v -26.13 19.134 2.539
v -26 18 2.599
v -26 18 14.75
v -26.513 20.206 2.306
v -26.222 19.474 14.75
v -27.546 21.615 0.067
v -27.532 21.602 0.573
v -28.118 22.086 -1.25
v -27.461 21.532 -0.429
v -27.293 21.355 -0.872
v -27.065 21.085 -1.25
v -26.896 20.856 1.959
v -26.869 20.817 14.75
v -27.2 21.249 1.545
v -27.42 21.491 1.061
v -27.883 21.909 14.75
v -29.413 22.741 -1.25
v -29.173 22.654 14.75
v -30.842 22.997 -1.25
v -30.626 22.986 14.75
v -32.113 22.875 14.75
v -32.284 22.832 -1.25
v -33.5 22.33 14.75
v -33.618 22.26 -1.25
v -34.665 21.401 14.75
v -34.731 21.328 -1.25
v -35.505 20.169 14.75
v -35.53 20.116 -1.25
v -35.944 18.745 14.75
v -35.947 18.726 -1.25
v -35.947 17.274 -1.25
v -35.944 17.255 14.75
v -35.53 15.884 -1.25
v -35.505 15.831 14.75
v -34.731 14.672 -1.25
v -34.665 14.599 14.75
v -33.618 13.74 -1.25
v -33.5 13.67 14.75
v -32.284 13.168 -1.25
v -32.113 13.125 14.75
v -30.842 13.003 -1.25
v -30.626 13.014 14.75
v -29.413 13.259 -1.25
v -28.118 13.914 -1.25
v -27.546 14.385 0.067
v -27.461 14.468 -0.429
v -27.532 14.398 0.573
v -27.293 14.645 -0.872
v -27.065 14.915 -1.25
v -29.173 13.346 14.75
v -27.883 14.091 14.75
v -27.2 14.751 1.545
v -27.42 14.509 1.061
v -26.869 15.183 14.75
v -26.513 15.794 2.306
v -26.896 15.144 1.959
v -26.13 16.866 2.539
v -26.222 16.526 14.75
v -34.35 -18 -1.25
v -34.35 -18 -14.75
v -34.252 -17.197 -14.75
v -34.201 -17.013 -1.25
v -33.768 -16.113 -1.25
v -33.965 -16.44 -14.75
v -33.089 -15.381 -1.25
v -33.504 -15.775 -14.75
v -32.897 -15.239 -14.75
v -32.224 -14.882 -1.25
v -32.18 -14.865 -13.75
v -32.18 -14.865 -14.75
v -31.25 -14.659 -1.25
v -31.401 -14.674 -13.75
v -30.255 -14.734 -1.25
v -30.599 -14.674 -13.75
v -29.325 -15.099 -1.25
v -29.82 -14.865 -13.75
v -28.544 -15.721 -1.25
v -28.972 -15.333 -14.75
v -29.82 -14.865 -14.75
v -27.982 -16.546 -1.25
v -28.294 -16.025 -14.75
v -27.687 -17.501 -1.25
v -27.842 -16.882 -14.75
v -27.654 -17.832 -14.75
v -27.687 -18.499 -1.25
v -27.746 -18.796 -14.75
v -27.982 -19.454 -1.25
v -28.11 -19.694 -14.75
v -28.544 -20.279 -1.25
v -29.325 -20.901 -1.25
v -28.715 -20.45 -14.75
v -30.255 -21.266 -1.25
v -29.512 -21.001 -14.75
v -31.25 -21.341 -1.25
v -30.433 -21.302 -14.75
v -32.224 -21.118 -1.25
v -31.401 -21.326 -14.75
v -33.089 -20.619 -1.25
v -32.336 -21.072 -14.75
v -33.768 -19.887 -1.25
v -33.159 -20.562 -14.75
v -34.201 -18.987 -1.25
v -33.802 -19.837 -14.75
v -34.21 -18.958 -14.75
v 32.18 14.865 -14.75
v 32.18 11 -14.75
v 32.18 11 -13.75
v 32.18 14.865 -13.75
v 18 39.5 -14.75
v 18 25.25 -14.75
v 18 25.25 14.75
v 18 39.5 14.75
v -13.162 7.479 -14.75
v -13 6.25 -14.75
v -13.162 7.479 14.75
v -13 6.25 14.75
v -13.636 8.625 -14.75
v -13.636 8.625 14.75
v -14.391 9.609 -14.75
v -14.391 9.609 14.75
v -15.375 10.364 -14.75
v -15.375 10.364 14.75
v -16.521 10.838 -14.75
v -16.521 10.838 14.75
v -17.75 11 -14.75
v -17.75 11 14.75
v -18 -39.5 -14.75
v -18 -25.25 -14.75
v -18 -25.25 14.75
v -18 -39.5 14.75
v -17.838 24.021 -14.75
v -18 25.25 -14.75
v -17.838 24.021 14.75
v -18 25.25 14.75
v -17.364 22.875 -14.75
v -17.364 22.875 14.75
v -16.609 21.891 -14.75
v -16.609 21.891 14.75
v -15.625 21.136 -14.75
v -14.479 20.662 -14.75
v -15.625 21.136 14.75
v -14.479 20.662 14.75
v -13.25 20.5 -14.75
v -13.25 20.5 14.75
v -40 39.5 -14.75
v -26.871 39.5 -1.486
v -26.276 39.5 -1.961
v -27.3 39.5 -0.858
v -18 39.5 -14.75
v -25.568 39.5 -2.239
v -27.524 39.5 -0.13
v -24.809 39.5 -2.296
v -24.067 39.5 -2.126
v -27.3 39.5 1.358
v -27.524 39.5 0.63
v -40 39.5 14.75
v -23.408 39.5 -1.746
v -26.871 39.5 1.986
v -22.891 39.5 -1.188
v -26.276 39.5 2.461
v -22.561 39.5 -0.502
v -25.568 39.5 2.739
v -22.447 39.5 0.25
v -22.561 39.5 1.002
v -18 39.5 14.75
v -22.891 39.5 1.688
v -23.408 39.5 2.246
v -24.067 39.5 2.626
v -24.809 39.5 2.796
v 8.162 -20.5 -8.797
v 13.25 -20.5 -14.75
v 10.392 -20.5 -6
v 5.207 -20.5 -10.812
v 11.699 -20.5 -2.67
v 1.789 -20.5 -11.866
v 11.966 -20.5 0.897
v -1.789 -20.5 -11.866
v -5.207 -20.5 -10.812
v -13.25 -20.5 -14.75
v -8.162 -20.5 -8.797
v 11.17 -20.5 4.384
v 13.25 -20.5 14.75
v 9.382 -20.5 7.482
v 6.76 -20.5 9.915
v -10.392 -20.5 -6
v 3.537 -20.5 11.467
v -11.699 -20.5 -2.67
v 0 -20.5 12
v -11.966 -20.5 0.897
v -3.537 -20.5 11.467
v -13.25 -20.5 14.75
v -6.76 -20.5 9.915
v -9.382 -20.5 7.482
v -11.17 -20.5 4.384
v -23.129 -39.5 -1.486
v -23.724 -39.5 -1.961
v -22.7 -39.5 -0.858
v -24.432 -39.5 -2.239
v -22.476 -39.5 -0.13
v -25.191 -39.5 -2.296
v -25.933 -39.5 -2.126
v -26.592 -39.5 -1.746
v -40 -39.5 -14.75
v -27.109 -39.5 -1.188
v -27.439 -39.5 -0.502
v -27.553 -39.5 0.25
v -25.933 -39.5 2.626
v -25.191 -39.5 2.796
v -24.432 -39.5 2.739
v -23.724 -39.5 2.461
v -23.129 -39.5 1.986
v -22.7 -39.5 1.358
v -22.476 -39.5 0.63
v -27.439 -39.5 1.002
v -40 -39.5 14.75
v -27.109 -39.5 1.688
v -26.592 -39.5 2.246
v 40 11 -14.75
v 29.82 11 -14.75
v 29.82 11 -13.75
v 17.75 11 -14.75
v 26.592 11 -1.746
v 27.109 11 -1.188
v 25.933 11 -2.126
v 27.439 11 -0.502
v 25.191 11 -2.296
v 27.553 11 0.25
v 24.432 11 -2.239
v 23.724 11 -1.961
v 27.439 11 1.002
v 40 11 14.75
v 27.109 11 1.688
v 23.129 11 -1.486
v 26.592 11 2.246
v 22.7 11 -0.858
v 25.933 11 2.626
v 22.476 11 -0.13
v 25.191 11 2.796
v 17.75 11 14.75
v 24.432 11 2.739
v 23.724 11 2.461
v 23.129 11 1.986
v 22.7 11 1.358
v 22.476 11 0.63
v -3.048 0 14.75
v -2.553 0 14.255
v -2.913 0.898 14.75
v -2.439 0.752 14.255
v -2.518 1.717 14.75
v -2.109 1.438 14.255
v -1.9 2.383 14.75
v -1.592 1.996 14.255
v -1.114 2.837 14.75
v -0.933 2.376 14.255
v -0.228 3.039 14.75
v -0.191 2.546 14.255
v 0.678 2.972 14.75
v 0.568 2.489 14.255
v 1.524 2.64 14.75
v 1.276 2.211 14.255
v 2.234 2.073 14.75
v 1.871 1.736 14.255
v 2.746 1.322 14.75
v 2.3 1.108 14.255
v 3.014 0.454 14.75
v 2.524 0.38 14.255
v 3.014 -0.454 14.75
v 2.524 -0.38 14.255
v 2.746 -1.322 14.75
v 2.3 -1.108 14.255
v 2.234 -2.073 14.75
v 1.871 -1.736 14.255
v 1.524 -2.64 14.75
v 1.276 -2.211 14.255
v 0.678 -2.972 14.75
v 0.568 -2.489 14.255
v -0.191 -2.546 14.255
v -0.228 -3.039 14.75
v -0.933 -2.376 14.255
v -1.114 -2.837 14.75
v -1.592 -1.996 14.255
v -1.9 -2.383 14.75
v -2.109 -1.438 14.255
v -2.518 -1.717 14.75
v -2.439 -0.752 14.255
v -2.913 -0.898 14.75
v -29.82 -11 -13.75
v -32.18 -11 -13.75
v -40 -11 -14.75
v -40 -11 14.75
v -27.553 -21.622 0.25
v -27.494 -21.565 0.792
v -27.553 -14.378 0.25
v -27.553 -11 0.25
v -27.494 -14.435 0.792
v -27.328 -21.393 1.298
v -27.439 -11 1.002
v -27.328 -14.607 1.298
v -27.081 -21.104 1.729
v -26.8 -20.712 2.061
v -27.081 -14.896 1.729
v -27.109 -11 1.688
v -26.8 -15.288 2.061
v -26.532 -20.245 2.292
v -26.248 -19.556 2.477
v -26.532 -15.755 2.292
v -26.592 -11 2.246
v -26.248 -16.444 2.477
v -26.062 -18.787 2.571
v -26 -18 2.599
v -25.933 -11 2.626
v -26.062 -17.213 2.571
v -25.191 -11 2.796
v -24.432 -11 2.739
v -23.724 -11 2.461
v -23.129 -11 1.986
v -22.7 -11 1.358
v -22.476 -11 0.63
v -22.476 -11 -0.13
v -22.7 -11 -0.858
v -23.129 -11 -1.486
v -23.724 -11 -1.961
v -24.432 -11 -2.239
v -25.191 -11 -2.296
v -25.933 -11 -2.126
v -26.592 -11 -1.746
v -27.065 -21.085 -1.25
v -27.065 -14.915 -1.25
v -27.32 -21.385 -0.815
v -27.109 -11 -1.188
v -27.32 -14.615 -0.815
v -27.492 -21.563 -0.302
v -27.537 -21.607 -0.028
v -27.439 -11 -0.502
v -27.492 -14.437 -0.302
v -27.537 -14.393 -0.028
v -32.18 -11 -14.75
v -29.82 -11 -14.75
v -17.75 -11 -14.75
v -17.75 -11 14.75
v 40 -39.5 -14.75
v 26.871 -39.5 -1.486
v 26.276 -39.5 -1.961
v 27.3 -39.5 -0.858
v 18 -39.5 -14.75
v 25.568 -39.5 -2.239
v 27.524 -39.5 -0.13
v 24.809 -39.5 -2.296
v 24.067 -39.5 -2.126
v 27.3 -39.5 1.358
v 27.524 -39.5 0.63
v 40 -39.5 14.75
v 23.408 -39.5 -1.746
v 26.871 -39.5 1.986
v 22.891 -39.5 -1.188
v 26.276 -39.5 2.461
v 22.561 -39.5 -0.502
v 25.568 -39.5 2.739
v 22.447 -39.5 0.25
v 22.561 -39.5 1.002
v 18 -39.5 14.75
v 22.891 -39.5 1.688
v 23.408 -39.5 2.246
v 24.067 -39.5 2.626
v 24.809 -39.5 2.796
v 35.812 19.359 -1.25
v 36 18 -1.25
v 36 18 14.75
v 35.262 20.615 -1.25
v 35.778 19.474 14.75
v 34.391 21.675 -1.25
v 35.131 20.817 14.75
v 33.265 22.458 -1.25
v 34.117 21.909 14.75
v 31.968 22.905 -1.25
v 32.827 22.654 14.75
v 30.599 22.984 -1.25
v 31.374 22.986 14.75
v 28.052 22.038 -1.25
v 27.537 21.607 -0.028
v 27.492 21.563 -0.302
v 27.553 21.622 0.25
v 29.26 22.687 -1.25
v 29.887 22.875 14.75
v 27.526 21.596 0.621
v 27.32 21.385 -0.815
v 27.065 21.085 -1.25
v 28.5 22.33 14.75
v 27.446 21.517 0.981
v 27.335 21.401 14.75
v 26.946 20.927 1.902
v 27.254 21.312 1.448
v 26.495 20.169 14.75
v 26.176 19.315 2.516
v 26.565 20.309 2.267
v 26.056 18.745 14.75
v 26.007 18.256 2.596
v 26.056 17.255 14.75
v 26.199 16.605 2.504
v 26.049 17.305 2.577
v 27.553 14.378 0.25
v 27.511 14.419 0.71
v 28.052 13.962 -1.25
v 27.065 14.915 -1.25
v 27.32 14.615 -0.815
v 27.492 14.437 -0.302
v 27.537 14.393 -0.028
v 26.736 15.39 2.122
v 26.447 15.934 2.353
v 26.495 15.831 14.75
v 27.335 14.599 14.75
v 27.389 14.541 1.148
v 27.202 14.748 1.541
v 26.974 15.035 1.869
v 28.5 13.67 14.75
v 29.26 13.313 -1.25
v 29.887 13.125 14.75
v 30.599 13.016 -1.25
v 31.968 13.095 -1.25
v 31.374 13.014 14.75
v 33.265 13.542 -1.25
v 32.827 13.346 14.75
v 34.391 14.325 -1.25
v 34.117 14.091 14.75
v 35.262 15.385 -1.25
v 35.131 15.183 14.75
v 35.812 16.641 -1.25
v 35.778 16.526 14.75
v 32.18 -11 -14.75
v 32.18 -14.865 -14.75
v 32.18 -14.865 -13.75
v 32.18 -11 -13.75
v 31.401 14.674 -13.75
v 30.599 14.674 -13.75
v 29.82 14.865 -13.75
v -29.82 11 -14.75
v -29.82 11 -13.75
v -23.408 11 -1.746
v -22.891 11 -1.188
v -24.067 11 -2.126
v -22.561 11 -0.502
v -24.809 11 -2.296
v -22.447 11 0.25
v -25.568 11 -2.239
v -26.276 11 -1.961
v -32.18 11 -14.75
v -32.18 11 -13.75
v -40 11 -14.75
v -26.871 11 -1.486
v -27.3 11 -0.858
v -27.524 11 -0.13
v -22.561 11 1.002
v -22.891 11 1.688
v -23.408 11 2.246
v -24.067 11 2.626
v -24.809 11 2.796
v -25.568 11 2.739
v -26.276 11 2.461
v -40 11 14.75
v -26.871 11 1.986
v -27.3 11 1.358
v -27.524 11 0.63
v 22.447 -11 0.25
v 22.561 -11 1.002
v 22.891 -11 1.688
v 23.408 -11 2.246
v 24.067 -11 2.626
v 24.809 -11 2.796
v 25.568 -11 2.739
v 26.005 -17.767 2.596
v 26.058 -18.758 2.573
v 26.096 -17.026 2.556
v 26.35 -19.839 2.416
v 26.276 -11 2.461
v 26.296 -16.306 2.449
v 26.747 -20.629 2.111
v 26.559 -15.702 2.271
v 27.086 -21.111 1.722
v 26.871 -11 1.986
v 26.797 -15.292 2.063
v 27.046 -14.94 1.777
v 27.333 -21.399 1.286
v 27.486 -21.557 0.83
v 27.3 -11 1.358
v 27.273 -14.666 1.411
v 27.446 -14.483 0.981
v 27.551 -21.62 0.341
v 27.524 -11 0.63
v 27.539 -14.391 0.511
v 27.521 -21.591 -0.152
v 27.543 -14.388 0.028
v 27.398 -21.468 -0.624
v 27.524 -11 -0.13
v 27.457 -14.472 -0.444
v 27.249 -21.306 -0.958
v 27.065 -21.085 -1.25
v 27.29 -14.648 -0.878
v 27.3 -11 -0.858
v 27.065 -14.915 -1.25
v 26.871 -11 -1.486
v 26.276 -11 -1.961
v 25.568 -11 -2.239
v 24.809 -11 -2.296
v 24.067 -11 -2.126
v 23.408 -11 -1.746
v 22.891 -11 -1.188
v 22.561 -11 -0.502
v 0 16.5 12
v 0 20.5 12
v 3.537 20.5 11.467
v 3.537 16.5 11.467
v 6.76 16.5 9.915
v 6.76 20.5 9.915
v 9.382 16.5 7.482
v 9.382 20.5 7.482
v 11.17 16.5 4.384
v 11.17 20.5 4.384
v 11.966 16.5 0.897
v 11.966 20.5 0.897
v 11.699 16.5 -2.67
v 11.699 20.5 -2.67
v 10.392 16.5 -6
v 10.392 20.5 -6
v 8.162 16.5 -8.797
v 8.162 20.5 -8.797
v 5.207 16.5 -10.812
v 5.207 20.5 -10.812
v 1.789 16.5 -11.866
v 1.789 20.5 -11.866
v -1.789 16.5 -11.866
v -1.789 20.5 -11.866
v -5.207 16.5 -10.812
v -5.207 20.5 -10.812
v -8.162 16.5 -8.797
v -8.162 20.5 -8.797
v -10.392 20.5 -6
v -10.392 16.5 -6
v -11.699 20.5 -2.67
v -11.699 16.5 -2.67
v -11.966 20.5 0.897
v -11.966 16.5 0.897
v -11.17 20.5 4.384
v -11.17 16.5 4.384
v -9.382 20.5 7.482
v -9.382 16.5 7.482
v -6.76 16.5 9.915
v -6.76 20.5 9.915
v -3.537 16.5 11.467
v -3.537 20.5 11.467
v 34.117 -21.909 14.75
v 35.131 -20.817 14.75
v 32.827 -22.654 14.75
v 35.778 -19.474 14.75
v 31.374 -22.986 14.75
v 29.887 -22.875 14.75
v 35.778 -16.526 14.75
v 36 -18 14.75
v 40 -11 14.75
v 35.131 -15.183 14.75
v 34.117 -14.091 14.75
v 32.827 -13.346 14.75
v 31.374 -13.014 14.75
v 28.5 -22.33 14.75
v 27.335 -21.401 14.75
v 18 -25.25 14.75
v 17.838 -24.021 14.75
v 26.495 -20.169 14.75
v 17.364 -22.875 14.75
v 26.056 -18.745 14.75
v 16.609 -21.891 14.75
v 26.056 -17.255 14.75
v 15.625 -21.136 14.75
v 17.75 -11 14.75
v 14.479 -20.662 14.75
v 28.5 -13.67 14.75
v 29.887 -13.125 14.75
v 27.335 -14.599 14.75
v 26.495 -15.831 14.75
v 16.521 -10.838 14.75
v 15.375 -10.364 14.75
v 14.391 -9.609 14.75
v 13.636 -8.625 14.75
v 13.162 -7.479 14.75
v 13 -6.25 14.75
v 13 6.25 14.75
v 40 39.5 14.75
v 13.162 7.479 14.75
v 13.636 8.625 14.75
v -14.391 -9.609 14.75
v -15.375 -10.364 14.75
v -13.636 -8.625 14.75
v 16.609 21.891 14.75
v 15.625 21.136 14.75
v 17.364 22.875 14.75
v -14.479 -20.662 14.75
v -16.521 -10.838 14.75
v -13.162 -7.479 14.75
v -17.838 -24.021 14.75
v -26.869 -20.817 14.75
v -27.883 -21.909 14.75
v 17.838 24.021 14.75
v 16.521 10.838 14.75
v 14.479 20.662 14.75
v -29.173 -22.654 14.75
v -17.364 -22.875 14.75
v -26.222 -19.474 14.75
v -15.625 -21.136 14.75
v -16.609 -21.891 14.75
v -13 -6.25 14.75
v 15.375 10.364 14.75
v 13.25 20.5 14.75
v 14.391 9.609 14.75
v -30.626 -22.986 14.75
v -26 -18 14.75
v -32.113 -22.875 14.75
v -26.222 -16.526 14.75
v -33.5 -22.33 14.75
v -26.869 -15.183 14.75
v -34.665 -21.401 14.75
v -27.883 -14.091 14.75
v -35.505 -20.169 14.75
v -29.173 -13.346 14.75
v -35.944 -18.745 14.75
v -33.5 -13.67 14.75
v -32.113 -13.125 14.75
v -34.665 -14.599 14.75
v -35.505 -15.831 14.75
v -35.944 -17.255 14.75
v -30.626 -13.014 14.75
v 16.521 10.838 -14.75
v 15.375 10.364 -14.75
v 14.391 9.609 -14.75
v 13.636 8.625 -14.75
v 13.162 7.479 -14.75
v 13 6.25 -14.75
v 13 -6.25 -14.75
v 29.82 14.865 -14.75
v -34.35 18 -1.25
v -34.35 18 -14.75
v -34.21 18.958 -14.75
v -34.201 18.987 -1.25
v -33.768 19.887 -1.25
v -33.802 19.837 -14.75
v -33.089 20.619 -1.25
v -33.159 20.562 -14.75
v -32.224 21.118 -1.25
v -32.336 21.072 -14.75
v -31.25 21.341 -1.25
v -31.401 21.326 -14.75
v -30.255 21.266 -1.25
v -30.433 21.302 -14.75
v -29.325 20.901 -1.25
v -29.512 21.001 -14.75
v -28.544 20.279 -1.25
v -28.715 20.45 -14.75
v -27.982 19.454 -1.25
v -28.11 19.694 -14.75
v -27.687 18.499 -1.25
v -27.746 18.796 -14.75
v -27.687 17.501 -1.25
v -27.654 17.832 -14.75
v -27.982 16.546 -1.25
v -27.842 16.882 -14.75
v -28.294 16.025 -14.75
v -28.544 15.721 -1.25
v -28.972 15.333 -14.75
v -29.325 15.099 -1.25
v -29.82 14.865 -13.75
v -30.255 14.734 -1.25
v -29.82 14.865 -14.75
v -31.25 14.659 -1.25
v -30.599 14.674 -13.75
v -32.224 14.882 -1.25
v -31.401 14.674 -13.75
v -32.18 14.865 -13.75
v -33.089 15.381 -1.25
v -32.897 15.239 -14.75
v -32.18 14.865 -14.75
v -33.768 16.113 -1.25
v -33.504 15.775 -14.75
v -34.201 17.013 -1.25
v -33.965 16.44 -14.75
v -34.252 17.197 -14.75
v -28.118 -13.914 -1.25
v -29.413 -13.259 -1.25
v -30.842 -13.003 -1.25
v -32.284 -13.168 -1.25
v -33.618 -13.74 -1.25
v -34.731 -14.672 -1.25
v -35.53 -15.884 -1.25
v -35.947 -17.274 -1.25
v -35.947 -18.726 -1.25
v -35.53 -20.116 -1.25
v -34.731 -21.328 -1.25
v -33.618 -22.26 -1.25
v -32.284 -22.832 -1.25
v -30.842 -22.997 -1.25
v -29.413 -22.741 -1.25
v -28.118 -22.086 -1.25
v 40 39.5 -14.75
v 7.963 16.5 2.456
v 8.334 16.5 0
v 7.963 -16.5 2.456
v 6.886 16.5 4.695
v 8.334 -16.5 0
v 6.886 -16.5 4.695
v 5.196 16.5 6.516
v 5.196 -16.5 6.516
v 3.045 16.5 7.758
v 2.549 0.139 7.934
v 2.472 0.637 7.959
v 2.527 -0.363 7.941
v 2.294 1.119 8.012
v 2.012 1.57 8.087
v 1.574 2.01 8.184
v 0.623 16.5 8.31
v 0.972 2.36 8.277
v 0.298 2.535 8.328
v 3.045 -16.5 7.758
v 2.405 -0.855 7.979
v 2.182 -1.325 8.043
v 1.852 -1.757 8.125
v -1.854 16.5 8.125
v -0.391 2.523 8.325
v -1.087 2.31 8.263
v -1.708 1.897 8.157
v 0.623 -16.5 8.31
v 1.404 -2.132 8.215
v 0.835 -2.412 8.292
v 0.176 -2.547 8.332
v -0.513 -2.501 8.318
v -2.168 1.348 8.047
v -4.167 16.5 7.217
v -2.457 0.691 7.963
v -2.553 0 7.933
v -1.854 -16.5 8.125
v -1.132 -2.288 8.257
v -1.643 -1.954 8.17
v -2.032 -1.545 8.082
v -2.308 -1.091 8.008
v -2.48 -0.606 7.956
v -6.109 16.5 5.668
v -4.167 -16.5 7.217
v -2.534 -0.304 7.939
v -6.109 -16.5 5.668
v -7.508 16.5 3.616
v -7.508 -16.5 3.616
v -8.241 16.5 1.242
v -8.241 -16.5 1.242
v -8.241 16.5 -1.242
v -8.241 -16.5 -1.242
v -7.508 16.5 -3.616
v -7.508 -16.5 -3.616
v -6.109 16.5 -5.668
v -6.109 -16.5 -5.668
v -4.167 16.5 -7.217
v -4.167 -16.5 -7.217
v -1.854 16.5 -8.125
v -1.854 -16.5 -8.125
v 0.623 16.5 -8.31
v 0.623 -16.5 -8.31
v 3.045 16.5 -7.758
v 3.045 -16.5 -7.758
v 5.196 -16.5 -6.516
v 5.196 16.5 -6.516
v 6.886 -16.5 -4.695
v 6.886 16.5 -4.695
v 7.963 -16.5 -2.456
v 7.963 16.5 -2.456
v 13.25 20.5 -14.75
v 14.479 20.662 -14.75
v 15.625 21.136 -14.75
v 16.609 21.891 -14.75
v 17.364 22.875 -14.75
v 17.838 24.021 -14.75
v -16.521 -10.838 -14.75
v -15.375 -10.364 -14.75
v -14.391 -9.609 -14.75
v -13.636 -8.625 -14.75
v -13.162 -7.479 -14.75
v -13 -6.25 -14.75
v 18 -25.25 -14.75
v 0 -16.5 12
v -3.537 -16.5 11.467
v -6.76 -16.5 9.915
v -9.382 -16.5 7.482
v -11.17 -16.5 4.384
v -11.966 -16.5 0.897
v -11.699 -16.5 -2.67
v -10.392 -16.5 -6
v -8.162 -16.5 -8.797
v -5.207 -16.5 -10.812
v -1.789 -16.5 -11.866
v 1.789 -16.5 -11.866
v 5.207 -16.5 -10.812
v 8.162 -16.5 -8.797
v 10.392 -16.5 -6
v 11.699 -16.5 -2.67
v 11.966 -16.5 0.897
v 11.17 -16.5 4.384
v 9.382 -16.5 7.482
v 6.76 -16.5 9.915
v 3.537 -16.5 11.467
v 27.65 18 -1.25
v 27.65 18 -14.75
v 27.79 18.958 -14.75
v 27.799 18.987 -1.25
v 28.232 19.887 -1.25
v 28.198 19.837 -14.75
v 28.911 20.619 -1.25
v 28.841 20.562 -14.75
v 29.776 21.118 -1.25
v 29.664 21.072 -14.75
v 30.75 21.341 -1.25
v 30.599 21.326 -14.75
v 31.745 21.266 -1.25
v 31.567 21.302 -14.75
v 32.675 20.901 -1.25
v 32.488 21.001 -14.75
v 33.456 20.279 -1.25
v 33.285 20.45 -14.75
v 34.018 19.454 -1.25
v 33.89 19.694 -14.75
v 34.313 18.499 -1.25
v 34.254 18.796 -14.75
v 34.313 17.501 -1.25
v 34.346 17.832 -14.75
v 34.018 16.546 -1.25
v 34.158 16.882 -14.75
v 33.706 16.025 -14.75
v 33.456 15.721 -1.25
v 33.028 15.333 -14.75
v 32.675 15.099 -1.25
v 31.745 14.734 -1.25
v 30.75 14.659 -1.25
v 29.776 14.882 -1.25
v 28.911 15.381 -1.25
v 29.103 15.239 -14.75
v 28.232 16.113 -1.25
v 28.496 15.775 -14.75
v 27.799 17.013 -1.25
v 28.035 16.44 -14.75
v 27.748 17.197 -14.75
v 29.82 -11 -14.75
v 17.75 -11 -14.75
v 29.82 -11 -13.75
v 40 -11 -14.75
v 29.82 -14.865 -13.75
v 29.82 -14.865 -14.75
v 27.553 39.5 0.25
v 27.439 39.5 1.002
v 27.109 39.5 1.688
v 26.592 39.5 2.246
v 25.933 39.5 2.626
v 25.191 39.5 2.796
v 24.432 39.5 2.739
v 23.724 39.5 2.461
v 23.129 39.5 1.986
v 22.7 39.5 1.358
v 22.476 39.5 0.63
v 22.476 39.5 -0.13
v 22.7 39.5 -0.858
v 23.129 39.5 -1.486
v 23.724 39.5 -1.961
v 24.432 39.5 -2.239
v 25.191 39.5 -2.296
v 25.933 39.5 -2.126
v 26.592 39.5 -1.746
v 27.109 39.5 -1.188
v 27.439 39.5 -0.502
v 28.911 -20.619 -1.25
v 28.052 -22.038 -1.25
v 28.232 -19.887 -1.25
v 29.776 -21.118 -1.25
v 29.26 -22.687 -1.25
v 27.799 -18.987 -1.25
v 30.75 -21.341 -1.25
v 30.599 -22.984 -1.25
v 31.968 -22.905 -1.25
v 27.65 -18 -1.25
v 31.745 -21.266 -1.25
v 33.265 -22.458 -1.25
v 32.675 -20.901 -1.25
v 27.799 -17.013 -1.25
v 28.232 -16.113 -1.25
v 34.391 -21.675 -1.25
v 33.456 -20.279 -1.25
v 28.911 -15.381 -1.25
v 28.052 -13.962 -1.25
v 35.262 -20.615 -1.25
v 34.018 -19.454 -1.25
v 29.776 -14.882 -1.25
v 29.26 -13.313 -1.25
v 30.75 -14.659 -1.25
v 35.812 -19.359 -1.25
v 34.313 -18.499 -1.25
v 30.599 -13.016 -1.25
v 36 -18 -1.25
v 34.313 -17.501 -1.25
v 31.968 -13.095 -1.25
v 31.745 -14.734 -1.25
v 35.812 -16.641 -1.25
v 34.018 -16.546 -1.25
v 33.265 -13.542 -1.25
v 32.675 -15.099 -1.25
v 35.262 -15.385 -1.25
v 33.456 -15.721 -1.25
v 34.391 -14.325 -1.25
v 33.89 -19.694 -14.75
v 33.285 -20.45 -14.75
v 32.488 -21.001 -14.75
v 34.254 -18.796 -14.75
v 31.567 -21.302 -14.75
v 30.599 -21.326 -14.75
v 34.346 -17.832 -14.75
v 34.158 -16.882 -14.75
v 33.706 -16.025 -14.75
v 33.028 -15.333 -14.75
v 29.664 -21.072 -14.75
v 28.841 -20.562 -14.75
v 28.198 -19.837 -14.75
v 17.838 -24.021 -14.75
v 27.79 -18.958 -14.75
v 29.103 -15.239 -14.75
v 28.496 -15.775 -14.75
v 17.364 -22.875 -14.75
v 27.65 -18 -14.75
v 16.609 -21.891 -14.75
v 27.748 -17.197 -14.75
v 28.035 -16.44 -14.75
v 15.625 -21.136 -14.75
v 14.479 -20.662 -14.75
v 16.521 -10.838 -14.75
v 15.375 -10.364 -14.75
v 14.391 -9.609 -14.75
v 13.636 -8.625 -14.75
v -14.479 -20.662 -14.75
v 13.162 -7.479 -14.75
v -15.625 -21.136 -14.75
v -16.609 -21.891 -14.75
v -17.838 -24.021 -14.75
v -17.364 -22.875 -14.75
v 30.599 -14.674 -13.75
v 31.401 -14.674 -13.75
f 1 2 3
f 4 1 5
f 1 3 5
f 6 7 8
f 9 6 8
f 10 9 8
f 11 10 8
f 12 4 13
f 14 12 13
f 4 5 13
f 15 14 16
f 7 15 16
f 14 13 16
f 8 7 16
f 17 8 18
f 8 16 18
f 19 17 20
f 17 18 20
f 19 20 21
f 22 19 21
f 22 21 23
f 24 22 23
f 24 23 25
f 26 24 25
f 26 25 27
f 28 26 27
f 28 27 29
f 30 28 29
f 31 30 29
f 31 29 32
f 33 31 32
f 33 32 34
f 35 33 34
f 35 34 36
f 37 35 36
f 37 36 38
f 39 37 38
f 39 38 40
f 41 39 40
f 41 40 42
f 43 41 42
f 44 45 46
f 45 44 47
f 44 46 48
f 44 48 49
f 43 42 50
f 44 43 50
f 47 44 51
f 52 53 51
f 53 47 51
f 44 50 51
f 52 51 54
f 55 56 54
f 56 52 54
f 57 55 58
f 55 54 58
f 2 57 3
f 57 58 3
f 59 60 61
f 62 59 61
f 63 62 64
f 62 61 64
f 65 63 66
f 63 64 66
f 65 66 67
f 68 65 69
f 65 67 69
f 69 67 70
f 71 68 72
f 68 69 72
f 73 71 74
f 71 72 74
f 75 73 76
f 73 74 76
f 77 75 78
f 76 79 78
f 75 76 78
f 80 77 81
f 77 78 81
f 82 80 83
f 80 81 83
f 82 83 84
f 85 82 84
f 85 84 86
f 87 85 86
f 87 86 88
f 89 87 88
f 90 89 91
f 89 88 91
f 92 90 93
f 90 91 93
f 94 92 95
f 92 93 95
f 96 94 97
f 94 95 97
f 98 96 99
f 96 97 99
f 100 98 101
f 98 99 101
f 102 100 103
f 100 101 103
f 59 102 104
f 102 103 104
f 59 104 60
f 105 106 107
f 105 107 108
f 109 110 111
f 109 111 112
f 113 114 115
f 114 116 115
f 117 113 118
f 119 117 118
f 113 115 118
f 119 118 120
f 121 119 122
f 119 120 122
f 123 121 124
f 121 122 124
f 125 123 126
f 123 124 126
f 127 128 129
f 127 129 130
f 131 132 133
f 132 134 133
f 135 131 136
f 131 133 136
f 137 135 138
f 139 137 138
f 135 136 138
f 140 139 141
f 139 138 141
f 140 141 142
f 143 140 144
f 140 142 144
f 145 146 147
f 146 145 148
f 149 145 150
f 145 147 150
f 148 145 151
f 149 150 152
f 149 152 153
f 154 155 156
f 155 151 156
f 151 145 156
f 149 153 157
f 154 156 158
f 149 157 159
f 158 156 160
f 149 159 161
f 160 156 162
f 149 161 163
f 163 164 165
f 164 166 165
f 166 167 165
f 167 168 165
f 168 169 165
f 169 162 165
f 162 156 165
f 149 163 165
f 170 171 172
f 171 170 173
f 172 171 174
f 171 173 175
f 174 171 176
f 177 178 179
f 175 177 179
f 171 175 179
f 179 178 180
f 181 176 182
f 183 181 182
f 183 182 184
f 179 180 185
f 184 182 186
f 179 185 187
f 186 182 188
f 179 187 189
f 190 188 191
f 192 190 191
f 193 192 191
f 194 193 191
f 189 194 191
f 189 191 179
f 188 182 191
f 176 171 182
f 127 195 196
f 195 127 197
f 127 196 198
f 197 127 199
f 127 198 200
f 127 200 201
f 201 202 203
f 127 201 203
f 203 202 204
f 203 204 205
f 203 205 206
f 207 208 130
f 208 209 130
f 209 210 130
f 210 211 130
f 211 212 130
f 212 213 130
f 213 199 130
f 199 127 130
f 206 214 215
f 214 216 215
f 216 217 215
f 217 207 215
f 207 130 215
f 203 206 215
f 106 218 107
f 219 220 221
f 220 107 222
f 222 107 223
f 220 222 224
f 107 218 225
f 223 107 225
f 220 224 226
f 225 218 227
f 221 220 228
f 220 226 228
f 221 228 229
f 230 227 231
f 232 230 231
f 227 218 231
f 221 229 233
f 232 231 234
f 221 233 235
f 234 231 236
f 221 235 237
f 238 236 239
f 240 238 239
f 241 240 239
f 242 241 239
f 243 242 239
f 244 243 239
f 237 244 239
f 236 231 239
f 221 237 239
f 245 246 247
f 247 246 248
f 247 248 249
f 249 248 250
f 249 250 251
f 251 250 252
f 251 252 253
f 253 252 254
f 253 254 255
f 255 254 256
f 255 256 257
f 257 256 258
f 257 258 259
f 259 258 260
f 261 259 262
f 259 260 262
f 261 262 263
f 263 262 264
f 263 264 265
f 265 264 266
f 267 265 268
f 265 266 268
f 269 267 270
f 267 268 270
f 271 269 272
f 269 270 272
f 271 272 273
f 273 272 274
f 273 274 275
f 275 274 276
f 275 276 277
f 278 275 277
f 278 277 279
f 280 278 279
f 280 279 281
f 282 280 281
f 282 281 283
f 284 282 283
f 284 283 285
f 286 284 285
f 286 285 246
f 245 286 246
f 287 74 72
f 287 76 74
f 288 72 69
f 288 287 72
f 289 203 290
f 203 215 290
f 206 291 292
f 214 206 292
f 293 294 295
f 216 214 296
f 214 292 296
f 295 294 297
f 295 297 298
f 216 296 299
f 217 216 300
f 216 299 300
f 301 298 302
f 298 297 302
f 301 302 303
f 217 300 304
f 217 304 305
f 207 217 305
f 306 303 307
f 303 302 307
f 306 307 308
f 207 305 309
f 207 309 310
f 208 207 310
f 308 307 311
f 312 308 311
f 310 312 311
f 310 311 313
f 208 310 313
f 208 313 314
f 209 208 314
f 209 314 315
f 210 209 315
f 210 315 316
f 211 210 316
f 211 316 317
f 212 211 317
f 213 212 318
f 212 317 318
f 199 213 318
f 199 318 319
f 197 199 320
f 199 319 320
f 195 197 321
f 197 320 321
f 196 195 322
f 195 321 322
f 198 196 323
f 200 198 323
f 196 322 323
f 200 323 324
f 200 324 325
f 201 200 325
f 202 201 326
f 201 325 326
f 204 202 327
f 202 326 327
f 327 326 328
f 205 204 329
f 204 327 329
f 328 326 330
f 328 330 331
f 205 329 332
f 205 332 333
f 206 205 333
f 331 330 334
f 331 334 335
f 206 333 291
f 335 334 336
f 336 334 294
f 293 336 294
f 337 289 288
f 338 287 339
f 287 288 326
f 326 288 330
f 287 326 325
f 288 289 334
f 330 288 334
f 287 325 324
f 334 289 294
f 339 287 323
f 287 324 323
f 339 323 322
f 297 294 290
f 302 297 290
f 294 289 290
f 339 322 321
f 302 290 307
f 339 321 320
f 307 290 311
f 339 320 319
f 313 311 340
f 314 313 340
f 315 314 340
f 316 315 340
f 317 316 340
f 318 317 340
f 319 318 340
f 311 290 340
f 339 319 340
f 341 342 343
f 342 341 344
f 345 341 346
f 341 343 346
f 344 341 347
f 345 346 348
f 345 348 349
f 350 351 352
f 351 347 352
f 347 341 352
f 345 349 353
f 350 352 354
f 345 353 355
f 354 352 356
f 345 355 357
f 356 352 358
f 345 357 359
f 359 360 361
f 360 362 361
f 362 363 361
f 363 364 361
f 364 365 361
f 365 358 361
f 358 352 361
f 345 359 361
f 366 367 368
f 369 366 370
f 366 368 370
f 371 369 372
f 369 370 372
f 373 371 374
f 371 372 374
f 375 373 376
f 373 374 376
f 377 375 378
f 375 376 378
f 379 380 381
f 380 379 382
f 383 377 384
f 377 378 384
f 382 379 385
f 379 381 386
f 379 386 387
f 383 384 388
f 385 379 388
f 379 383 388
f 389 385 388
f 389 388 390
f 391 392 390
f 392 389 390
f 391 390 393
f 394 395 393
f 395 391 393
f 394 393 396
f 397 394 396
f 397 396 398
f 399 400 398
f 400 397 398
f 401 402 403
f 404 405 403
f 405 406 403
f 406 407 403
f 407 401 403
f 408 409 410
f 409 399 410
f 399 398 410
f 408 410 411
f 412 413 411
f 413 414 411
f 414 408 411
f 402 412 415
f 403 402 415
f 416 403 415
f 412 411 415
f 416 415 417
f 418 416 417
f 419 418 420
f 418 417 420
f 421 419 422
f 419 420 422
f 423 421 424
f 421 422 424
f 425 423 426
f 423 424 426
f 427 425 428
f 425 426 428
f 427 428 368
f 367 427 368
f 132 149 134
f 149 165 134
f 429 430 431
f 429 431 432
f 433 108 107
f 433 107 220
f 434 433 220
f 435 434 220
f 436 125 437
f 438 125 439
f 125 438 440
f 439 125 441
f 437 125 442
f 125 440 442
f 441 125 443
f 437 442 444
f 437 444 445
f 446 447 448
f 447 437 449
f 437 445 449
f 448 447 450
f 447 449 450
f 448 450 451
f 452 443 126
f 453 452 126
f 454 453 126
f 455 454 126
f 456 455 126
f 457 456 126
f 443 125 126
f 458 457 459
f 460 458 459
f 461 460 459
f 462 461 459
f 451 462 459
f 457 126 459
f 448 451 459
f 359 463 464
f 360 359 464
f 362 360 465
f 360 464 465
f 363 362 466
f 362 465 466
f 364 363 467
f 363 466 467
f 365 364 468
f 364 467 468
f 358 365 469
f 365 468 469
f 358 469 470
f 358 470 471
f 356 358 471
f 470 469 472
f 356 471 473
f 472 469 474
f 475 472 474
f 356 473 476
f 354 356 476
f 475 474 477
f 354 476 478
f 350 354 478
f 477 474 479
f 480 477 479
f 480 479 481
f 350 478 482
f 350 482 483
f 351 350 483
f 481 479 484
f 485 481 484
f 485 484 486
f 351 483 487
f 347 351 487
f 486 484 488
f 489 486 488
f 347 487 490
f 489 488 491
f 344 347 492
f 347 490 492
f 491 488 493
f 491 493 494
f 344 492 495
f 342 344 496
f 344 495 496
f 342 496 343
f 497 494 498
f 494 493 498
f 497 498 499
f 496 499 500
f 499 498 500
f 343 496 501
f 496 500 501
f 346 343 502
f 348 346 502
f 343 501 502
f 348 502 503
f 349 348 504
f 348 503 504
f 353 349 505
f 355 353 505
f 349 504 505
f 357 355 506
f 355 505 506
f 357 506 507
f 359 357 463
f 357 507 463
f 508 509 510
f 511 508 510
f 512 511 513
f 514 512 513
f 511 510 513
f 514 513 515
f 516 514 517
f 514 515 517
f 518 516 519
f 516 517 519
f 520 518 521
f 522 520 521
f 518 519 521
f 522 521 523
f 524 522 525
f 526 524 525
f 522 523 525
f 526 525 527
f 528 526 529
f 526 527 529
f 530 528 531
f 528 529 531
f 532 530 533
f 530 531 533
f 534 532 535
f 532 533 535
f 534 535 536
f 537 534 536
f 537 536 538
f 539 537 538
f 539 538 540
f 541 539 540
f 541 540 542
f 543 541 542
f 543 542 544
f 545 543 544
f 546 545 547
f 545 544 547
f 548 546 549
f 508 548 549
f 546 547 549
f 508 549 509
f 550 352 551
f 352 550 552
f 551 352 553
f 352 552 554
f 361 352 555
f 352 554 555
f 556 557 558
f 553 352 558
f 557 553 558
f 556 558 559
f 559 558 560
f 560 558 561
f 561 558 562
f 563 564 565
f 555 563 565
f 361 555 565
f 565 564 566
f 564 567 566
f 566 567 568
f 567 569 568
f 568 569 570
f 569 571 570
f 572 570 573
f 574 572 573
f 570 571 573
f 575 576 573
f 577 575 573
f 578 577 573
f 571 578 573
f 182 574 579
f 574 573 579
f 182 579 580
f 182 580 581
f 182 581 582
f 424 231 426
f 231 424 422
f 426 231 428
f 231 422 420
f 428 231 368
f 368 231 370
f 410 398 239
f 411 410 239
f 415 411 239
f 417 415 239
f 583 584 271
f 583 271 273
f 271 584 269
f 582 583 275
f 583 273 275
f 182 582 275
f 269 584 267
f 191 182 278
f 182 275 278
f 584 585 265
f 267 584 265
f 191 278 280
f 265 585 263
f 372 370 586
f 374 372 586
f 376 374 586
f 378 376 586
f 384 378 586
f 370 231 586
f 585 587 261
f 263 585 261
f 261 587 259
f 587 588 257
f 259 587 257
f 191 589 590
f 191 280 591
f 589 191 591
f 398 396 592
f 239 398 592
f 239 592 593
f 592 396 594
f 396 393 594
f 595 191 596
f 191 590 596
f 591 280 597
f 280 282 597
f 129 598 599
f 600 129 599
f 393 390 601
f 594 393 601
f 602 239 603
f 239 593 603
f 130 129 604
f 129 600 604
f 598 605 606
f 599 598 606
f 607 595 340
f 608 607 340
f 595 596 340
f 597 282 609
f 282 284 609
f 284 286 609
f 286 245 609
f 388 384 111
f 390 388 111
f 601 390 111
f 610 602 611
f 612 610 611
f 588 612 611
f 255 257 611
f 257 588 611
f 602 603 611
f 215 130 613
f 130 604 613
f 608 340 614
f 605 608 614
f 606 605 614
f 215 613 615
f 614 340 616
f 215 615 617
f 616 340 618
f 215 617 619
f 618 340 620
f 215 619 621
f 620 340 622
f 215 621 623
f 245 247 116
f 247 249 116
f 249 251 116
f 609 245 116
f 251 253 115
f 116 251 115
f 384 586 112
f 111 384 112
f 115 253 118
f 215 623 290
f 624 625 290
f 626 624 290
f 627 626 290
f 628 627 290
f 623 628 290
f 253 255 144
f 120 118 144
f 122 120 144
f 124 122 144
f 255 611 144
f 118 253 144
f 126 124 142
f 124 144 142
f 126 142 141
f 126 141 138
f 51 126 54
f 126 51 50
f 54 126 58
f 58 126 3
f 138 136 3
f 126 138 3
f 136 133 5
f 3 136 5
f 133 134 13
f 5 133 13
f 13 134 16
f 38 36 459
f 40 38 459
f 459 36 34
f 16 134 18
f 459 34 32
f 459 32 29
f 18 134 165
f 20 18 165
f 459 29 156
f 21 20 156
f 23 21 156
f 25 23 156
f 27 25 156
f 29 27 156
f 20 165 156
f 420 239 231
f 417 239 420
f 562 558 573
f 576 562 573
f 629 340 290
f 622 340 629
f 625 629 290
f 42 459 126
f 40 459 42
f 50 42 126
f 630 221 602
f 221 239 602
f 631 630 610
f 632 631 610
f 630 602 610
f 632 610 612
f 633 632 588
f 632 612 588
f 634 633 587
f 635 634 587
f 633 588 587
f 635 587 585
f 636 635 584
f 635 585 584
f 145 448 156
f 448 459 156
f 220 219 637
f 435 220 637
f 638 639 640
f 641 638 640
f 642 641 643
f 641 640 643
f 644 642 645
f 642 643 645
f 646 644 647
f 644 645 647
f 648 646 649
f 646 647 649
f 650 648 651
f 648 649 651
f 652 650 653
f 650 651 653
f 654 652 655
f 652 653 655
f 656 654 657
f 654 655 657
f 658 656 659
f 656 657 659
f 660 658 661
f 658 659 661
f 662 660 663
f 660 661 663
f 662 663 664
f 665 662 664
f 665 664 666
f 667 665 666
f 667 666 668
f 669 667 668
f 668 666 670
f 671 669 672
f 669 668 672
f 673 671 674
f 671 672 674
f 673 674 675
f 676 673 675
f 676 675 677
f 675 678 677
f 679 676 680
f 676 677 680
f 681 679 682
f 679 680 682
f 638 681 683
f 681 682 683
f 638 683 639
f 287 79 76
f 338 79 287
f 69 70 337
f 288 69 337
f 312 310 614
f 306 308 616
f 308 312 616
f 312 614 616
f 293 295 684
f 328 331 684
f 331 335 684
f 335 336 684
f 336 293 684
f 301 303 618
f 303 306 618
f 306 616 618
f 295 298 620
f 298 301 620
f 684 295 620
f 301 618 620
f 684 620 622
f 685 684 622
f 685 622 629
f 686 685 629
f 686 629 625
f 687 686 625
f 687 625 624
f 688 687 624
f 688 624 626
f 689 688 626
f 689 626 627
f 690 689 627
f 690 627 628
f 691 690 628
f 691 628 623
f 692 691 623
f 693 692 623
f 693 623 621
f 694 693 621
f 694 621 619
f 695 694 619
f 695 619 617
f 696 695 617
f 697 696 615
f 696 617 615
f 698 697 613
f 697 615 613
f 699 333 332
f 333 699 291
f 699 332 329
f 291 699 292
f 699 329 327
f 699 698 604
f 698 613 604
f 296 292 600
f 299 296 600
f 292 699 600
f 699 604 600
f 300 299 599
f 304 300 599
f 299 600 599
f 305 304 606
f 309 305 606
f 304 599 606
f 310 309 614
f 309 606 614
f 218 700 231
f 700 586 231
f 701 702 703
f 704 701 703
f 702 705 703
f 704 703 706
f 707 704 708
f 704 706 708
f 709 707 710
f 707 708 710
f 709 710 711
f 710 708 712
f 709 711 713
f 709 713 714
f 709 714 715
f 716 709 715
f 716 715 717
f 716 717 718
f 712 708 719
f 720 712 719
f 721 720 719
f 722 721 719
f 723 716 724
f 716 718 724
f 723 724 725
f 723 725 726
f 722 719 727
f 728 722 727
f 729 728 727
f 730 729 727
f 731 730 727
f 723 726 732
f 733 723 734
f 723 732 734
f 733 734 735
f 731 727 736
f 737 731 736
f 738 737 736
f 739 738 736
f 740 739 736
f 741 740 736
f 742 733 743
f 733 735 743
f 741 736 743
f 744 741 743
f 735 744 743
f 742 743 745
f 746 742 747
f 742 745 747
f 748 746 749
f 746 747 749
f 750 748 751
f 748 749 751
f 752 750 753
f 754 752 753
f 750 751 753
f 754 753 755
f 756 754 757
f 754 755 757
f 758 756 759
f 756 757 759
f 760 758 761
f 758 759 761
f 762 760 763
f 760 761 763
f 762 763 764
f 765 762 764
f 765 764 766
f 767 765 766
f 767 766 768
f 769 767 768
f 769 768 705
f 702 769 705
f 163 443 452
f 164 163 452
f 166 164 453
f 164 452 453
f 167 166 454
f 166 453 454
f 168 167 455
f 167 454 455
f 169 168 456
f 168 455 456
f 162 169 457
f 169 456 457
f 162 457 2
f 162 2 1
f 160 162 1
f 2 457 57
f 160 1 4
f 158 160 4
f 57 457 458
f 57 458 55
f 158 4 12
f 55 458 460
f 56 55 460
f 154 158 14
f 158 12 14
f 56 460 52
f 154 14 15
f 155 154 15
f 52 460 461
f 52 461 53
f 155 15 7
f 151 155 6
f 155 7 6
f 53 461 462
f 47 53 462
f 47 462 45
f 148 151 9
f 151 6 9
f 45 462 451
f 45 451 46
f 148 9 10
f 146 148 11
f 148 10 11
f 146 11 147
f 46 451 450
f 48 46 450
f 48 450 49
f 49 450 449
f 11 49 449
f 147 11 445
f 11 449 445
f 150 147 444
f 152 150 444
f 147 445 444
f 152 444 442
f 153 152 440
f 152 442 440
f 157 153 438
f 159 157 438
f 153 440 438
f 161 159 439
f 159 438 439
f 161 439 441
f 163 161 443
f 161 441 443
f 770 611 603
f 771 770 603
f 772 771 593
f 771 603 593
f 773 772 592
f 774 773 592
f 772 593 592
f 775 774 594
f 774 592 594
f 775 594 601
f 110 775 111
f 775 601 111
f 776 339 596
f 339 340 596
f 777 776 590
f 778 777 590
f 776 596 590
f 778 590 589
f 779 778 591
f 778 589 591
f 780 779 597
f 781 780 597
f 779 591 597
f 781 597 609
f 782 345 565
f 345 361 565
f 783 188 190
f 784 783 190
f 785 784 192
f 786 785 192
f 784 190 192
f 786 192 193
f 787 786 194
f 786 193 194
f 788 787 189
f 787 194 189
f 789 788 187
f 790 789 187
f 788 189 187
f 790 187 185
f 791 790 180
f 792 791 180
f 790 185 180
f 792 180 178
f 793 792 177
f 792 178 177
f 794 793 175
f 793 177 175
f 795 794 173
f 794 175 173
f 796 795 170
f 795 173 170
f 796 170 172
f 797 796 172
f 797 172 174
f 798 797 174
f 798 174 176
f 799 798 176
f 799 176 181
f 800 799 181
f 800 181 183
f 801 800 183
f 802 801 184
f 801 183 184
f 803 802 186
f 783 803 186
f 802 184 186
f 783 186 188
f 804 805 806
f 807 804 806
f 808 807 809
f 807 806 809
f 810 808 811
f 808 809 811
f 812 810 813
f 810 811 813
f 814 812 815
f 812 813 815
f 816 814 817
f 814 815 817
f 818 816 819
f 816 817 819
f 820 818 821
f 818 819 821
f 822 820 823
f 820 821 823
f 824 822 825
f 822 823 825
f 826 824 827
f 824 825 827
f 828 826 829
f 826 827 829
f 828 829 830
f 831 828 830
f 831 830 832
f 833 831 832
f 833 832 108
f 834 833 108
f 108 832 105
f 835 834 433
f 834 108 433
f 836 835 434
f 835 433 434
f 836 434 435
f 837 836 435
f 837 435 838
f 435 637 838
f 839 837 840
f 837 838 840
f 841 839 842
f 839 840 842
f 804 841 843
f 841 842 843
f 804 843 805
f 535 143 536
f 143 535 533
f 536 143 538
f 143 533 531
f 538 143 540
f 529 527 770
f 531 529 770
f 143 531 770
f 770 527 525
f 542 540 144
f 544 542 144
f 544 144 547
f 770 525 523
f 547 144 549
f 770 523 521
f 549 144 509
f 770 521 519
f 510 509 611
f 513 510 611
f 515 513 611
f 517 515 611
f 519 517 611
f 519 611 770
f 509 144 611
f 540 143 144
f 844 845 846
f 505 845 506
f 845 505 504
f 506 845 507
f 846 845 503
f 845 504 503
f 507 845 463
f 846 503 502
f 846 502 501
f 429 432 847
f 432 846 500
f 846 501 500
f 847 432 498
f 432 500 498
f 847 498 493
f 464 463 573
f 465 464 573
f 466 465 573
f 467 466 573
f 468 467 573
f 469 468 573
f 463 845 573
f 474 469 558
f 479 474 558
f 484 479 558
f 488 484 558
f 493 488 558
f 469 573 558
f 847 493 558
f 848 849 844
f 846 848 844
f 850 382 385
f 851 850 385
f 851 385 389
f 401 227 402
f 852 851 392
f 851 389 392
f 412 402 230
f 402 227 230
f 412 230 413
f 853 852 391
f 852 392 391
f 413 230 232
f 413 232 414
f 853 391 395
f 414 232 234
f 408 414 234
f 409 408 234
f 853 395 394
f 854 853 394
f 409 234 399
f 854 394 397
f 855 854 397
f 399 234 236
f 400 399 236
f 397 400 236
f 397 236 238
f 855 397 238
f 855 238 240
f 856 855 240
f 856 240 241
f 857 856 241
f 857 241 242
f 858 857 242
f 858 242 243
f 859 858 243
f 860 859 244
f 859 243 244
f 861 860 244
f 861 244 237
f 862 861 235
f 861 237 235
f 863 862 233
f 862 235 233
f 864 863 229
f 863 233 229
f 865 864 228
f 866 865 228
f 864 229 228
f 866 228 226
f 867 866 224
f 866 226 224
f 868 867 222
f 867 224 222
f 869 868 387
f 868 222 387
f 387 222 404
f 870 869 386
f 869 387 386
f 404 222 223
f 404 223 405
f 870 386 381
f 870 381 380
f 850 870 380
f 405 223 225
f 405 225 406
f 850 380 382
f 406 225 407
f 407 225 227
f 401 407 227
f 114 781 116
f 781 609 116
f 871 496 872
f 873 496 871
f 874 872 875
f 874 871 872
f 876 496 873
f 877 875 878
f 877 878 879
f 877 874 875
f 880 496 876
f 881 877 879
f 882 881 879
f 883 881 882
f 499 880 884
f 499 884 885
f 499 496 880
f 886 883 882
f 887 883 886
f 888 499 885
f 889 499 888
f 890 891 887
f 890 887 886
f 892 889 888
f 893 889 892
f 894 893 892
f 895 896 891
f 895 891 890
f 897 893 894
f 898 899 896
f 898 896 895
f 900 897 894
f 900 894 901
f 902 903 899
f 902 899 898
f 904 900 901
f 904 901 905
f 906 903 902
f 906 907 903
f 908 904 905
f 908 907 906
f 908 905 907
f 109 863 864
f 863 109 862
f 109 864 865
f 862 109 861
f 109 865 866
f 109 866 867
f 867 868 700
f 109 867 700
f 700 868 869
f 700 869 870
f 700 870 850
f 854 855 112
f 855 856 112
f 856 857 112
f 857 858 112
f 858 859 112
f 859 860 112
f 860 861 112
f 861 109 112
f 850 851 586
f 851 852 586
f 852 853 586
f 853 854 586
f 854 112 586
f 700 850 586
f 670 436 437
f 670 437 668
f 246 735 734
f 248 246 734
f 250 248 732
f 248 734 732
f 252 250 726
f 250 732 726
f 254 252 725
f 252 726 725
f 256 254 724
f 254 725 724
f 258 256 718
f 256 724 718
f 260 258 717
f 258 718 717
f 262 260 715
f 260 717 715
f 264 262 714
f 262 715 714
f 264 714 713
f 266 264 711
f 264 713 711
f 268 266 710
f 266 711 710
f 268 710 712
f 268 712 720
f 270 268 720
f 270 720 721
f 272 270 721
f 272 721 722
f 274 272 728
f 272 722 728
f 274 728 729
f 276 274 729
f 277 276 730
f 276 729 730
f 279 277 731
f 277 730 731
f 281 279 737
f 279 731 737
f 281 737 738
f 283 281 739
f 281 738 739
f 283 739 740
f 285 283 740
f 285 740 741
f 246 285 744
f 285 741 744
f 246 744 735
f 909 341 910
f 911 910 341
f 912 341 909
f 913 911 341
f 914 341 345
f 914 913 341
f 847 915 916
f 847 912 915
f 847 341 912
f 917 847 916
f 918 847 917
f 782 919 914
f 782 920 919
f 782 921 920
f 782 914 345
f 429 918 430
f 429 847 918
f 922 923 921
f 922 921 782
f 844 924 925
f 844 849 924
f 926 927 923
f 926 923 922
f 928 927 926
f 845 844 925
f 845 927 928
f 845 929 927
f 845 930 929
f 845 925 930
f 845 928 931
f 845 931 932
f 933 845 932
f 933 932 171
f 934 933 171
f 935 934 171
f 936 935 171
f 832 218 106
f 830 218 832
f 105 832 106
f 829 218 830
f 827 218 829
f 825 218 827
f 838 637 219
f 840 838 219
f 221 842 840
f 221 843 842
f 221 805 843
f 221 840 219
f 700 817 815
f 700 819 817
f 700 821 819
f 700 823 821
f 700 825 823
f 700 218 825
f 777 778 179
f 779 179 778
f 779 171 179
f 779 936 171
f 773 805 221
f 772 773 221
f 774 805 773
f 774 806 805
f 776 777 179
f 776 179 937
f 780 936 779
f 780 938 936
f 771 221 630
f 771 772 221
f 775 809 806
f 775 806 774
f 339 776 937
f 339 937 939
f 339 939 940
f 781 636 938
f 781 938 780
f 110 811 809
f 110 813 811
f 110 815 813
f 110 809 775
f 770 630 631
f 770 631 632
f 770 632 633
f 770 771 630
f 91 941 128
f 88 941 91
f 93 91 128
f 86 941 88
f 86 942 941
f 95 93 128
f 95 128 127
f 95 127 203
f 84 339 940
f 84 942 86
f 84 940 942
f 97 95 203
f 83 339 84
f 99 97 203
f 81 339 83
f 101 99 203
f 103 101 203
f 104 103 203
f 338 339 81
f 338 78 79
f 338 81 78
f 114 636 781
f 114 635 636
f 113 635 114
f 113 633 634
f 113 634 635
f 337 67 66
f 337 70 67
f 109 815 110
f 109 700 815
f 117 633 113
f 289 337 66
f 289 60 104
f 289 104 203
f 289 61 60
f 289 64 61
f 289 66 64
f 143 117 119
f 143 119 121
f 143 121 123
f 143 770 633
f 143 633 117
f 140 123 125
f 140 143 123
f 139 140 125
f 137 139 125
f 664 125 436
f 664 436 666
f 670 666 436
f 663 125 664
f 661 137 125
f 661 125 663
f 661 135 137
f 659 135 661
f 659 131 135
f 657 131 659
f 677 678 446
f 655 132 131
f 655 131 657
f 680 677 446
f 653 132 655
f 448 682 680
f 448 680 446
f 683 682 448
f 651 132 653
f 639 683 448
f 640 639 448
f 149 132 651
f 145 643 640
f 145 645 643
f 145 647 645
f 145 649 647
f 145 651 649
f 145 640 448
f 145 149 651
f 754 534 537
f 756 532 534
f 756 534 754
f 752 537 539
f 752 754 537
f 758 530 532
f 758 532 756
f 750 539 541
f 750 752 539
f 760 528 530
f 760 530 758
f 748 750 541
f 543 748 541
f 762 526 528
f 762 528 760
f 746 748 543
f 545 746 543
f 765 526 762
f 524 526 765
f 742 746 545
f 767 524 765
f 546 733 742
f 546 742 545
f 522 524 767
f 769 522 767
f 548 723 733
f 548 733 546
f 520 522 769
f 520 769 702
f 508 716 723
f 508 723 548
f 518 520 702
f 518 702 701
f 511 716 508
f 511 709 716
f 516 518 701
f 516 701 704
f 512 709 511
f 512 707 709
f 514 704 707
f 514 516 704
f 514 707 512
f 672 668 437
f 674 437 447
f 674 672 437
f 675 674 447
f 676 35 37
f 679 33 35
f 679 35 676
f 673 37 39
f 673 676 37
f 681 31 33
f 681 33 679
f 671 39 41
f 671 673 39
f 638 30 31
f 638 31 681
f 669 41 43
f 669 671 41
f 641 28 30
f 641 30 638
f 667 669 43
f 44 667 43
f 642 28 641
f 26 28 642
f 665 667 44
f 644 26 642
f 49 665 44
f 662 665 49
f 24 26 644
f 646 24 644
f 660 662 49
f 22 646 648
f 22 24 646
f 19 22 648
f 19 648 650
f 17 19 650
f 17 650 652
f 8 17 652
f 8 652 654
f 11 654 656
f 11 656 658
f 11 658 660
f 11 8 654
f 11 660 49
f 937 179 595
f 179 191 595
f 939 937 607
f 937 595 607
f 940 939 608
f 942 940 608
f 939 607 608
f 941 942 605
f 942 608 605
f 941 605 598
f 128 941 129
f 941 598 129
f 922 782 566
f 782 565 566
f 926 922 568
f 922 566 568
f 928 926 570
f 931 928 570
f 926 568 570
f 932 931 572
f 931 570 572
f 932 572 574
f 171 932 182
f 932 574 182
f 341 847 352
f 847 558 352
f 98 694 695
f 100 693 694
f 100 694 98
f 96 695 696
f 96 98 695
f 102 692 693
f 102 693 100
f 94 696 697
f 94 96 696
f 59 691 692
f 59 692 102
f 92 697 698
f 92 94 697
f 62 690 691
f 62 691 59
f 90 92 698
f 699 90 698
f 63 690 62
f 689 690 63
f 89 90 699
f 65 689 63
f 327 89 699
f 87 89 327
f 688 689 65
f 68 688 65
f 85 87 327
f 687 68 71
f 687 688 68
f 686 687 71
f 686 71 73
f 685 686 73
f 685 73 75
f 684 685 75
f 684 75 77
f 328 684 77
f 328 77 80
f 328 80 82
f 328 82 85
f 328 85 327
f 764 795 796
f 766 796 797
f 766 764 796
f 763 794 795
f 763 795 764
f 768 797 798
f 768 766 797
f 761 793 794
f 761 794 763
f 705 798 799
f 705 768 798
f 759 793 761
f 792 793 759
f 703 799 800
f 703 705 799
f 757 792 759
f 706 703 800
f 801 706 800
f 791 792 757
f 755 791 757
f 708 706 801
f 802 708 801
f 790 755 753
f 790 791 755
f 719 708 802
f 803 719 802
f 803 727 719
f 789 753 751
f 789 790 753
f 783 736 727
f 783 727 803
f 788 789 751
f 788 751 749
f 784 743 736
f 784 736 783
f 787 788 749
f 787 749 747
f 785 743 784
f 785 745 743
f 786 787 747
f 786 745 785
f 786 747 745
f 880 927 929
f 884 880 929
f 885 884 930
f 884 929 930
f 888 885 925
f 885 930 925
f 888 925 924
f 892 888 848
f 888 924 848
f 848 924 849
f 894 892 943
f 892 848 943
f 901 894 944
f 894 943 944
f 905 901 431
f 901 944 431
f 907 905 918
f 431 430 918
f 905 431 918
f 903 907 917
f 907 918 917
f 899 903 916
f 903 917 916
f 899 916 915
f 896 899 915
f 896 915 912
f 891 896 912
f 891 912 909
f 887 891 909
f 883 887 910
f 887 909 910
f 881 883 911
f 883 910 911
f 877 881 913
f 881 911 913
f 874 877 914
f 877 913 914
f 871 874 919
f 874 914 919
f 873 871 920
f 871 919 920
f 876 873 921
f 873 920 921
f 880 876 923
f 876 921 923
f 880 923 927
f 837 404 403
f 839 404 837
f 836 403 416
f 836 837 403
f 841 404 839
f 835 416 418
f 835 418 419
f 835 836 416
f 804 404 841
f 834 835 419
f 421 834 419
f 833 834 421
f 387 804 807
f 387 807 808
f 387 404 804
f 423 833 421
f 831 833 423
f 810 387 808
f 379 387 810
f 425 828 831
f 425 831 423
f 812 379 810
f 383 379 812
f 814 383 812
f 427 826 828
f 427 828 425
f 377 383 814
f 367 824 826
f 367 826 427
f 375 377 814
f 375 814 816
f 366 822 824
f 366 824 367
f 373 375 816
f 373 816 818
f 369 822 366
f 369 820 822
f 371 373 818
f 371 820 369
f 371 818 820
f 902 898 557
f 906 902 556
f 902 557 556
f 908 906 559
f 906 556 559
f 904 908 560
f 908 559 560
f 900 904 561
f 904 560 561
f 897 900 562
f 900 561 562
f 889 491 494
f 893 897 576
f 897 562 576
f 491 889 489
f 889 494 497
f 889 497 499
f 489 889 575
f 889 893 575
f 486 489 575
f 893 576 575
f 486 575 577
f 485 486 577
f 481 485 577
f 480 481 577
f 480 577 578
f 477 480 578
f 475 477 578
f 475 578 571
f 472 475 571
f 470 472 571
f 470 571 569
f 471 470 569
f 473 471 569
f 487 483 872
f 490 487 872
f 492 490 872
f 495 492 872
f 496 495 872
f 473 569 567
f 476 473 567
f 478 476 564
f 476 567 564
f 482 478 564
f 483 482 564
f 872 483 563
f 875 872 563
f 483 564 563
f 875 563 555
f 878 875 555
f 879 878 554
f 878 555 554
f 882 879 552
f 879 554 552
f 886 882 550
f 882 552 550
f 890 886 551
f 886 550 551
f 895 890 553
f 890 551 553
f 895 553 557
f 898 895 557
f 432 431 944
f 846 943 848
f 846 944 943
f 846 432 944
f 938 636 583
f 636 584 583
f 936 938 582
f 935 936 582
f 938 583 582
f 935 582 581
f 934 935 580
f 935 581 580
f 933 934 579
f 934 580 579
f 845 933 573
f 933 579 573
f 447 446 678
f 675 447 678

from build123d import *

# Parameters (mm, degrees)
BOSS_EXTRUDE1_DEPTH                         = 14.75
CBORE_FOR_M6_HEX_HEAD_BOLT1_D               = 6.7
CBORE_FOR_M6_HEX_HEAD_BOLT1_CBORE_D         = 10
CBORE_FOR_M6_HEX_HEAD_BOLT1_CBORE_DEPTH     = 16
TAPPED_HOLE_FOR_10_32_HELICOIL1_D           = 5.1054
TAPPED_HOLE_FOR_10_32_HELICOIL1_DEPTH       = 11.9888
TAPPED_HOLE_FOR_10_32_HELICOIL1_CSINK_D     = 6.096
TAPPED_HOLE_FOR_10_32_HELICOIL1_CSINK_ANGLE = 90
TAPPED_HOLE_FOR_10_32_HELICOIL1_TIP         = 1.533816902
F_3_4_10_TAPPED_HOLE1_D                     = 16.66748
SKETCH11_R                                  = 12
CUT_EXTRUDE1_DEPTH                          = 4
SKETCH12_R                                  = 12
CUT_EXTRUDE2_DEPTH                          = 4
F_1_4_20_TAPPED_HOLE1_D                     = 5.1054
F_1_4_20_TAPPED_HOLE1_DEPTH                 = 28.5
F_1_4_20_TAPPED_HOLE2_D                     = 5.1054
F_1_4_20_TAPPED_HOLE2_DEPTH                 = 28.5
SKETCH20_W                                  = 2.36
SKETCH20_H                                  = 33.600070702
SKETCH20_H_2                                = 33.600816511
CUT_EXTRUDE3_DEPTH                          = 1


with BuildPart() as part:
    # Sketch1 → Boss-Extrude1 (new body, symmetric)
    with BuildSketch(Plane.XY):
        with BuildLine():
            Line((18, 39.5), (40, 39.5))
            Line((40, 39.5), (40, 11))
            Line((40, 11), (17.75, 11))
            ThreePointArc((17.75, 11), (14.391242789, 9.608757211), (13, 6.25))
            Line((13, 6.25), (13, -6.25))
            ThreePointArc((13, -6.25), (14.391242789, -9.608757211), (17.75, -11))
            Line((17.75, -11), (40, -11))
            Line((40, -11), (40, -39.5))
            Line((40, -39.5), (18, -39.5))
            Line((18, -39.5), (18, -25.25))
            ThreePointArc((18, -25.25), (16.608757211, -21.891242789), (13.25, -20.5))
            Line((13.25, -20.5), (-13.25, -20.5))
            ThreePointArc((-13.25, -20.5), (-16.608757211, -21.891242789), (-18, -25.25))
            Line((-18, -25.25), (-18, -39.5))
            Line((-18, -39.5), (-40, -39.5))
            Line((-40, -39.5), (-40, -11))
            Line((-40, -11), (-17.75, -11))
            ThreePointArc((-17.75, -11), (-14.391242789, -9.608757211), (-13, -6.25))
            Line((-13, -6.25), (-13, 6.25))
            ThreePointArc((-13, 6.25), (-14.391242789, 9.608757211), (-17.75, 11))
            Line((-17.75, 11), (-40, 11))
            Line((-40, 11), (-40, 39.5))
            Line((-40, 39.5), (-18, 39.5))
            Line((-18, 39.5), (-18, 25.25))
            ThreePointArc((-18, 25.25), (-16.608757211, 21.891242789), (-13.25, 20.5))
            Line((-13.25, 20.5), (13.25, 20.5))
            ThreePointArc((13.25, 20.5), (16.608757211, 21.891242789), (18, 25.25))
            Line((18, 25.25), (18, 39.5))
        make_face()
    extrude(amount=BOSS_EXTRUDE1_DEPTH, both=True)

    # CBORE for M6 Hex Head Bolt1 (through all)
    with Locations(Plane.XY.offset(14.75)):
        with Locations((31, 18), (-31, 18), (-31, -18), (31, -18)):
            CounterBoreHole(CBORE_FOR_M6_HEX_HEAD_BOLT1_D / 2, CBORE_FOR_M6_HEX_HEAD_BOLT1_CBORE_D / 2, CBORE_FOR_M6_HEX_HEAD_BOLT1_CBORE_DEPTH)

    # Tapped Hole for #10-32 Helicoil1
    with Locations(Plane.XY.offset(14.75)):
        with Locations((0, 0)):
            CounterSinkHole(TAPPED_HOLE_FOR_10_32_HELICOIL1_D / 2, TAPPED_HOLE_FOR_10_32_HELICOIL1_CSINK_D / 2, depth=TAPPED_HOLE_FOR_10_32_HELICOIL1_DEPTH, counter_sink_angle=TAPPED_HOLE_FOR_10_32_HELICOIL1_CSINK_ANGLE)
            with Locations((0, 0, -(TAPPED_HOLE_FOR_10_32_HELICOIL1_DEPTH + TAPPED_HOLE_FOR_10_32_HELICOIL1_TIP / 2))):  # 118° drill point
                Cone(0, TAPPED_HOLE_FOR_10_32_HELICOIL1_D / 2, TAPPED_HOLE_FOR_10_32_HELICOIL1_TIP, mode=Mode.SUBTRACT)

    # 3/4-10 Tapped Hole1 (through all)
    with Locations(Plane(origin=(0, 20.5, 0), x_dir=(-1, 0, 0), z_dir=(0, 1, 0))):
        with Locations((0, 0)):
            Hole(F_3_4_10_TAPPED_HOLE1_D / 2)

    # Sketch11 → Cut-Extrude1 (cut)
    with BuildSketch(Plane(origin=(0, 20.5, 0), x_dir=(1, 0, 0), z_dir=(0, 1, 0))):
        with Locations(Location((0, 0, 0), (0, 0, 270))):  # turned: the seam where the file's is
            Circle(SKETCH11_R)
    extrude(amount=-CUT_EXTRUDE1_DEPTH, mode=Mode.SUBTRACT)

    # Sketch12 → Cut-Extrude2 (cut)
    with BuildSketch(Plane.XZ.offset(20.5)):
        with Locations(Location((0, 0, 0), (0, 0, 90))):  # turned: the seam where the file's is
            Circle(SKETCH12_R)
    extrude(amount=-CUT_EXTRUDE2_DEPTH, mode=Mode.SUBTRACT)

    # 1/4-20 Tapped Hole1
    with Locations(Plane(origin=(0, 39.5, 0), x_dir=(-1, 0, 0), z_dir=(0, 1, 0))):
        with Locations((-25, 0.25), (25, 0.25)):
            Hole(F_1_4_20_TAPPED_HOLE1_D / 2, depth=F_1_4_20_TAPPED_HOLE1_DEPTH)

    # 1/4-20 Tapped Hole2
    with Locations(Plane.XZ.offset(39.5)):
        with Locations((25, 0.25), (-25, 0.25)):
            Hole(F_1_4_20_TAPPED_HOLE2_D / 2, depth=F_1_4_20_TAPPED_HOLE2_DEPTH)

    # Sketch20 → Cut-Extrude3 (cut)
    with BuildSketch(Plane(origin=(0, 0, -14.75), x_dir=(-1, 0, 0), z_dir=(0, 0, -1))):
        with Locations((31, -0.882383927)):
            Rectangle(SKETCH20_W, SKETCH20_H)
        with Locations((-31, -0.882756832)):
            Rectangle(SKETCH20_W, SKETCH20_H_2)
    extrude(amount=-CUT_EXTRUDE3_DEPTH, mode=Mode.SUBTRACT)


solid = part.part
